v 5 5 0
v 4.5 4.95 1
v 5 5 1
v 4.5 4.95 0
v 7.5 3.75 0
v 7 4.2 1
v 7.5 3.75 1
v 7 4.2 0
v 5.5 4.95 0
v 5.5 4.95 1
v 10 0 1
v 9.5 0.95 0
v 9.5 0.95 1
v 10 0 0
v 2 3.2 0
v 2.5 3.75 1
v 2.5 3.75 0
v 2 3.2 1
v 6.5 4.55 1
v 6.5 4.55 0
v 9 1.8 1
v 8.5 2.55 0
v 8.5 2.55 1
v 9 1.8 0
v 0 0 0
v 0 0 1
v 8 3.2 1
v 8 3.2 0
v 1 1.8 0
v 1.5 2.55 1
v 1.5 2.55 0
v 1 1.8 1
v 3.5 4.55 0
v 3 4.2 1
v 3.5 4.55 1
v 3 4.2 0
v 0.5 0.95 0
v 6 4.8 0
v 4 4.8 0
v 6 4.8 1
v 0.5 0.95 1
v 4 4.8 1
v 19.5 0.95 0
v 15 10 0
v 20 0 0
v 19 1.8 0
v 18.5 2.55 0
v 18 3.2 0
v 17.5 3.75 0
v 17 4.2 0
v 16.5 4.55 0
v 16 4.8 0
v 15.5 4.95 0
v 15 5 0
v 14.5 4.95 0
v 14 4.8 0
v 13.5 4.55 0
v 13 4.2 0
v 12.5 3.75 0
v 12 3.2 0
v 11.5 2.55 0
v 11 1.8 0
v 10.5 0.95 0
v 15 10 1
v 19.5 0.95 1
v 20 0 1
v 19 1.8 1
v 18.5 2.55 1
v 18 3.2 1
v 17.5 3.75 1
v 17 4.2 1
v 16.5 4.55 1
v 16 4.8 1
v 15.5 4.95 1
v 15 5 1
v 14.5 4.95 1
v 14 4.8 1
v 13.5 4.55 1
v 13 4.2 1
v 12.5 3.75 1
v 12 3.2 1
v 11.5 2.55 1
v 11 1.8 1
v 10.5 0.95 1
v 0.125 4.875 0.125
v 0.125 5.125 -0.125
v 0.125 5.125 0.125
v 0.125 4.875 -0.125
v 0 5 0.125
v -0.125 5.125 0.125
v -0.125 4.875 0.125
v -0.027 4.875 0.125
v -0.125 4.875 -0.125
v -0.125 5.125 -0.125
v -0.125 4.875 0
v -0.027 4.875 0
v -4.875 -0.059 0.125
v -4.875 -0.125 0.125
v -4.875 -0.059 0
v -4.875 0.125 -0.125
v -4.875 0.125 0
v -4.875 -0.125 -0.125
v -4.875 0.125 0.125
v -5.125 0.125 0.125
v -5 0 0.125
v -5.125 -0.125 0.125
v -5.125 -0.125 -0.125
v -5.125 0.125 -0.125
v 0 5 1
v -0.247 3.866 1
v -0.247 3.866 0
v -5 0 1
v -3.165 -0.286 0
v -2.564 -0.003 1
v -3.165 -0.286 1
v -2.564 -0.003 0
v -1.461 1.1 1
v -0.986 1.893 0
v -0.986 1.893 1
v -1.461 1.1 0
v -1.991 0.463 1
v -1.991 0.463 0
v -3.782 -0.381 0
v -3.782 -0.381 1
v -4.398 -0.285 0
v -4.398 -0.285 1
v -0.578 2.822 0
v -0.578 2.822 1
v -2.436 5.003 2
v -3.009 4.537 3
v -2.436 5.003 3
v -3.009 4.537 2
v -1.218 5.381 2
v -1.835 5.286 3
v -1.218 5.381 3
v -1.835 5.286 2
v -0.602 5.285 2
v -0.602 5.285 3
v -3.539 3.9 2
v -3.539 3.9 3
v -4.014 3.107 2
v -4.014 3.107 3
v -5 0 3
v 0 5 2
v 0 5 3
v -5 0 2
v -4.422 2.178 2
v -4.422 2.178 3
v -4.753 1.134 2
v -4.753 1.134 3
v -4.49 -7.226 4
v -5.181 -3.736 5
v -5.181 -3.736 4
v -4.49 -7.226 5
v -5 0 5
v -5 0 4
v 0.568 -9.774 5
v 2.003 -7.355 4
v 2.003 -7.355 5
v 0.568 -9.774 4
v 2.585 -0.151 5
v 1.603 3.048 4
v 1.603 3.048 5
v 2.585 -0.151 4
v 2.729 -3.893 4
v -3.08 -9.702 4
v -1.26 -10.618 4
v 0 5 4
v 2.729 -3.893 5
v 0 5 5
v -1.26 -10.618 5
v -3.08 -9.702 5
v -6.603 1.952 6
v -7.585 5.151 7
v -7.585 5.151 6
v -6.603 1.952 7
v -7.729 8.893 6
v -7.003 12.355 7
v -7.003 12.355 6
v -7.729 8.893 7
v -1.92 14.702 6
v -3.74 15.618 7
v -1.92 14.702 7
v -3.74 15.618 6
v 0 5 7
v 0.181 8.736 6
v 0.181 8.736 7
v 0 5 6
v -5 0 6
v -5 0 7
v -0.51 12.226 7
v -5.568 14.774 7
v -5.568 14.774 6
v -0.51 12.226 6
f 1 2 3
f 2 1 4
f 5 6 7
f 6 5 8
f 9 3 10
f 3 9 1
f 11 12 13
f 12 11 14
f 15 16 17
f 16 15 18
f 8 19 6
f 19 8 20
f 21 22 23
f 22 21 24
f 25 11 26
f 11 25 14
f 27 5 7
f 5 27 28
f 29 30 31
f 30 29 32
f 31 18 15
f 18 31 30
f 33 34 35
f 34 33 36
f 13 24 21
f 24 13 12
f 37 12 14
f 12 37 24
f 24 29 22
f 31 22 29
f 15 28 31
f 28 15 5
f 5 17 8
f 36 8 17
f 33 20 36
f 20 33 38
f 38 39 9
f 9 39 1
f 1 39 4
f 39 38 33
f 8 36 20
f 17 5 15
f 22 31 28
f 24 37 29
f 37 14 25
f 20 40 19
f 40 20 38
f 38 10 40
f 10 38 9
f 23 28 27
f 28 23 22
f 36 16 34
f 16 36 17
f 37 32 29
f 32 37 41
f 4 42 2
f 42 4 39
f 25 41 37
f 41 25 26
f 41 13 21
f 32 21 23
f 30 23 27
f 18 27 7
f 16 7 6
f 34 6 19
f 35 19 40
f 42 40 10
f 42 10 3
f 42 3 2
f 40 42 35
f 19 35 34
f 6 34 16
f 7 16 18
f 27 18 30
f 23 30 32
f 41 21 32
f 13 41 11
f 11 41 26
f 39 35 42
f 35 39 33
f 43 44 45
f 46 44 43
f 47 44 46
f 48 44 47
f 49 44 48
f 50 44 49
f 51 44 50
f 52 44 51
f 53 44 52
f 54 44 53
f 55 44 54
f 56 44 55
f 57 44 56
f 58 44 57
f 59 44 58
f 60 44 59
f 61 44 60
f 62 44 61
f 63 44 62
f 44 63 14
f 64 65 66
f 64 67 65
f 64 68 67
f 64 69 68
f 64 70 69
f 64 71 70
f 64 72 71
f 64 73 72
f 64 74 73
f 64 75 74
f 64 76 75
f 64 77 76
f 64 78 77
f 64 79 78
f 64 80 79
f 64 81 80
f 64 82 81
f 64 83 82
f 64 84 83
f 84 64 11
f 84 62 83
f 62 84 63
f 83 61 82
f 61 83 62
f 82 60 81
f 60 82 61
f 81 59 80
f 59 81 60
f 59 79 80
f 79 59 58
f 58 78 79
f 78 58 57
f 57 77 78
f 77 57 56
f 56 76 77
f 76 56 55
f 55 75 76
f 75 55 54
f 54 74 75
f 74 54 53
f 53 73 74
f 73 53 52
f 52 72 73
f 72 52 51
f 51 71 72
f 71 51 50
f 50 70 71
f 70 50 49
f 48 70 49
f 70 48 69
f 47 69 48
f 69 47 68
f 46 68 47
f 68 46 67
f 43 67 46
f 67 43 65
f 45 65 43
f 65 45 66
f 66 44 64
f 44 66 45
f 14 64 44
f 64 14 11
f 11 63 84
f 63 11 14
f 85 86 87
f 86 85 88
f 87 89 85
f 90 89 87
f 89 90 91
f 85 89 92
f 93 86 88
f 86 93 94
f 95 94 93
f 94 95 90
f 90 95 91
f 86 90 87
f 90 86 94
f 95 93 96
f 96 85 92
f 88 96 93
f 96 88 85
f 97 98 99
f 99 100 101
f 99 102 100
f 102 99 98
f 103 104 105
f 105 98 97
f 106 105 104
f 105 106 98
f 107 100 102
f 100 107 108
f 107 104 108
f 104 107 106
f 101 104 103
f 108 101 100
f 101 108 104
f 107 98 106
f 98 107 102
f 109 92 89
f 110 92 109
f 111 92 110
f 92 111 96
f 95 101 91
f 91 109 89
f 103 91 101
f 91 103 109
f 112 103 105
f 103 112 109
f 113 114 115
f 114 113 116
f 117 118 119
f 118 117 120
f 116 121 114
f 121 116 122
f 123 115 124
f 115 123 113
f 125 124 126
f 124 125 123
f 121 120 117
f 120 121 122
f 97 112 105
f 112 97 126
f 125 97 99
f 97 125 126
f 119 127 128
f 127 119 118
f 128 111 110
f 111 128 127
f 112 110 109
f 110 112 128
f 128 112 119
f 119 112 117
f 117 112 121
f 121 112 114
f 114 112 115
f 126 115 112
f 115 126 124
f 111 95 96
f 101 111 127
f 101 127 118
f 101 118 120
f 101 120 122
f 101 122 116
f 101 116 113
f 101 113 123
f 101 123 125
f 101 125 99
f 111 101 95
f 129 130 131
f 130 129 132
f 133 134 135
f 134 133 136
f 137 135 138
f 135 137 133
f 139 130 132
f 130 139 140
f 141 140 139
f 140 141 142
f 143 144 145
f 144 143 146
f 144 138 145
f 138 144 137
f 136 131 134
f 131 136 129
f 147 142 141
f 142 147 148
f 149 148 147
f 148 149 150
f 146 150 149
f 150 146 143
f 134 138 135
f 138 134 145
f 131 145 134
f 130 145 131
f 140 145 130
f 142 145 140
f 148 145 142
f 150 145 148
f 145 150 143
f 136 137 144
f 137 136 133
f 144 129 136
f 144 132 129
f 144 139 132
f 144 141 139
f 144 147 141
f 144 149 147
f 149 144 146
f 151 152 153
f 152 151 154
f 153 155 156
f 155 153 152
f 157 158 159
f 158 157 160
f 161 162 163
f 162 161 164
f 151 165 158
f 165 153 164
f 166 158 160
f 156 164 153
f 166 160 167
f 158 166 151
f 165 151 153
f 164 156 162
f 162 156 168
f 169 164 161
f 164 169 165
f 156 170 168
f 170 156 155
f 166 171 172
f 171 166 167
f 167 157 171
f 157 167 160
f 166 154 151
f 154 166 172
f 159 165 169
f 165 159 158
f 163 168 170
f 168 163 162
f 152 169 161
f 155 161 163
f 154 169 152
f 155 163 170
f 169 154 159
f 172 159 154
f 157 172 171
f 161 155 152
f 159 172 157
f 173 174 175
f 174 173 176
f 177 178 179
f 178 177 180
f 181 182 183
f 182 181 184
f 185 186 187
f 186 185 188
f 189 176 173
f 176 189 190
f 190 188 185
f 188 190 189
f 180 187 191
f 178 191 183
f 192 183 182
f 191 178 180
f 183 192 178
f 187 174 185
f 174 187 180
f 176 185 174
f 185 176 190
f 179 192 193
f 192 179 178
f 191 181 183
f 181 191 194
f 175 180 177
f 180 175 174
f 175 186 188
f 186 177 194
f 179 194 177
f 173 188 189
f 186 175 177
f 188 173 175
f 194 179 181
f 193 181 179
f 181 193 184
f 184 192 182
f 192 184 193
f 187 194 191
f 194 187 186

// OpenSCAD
// Lines ----------------------------------------------------------------------
function linearBasis(a, b, t) =
  (1-t)*a +
  t*b;

function linearPoint(a, b, t) = [
  linearBasis(a[0], b[0], t),
  linearBasis(a[1], b[1], t)
];

// Quadratic Bezier Curves ----------------------------------------------------
function quadraticBezierBasis(a, b, c, t) =
  pow(1-t, 2)*a +
  2*(1-t)*t*b +
  pow(t,2)*c;

function quadraticBezierPoint(a, b, c, t) = [
  quadraticBezierBasis(a[0], b[0], c[0], t),
  quadraticBezierBasis(a[1], b[1], c[1], t)
];

module quadraticBezierShape(a, b, c, n=10, convex=true) {
  m = convex ? [(a[0] + c[0])/2, (a[1] + c[1])/2] : b;
  union() for (i = [0 : n-1]) {
    polygon(
      points = [
        m,
        quadraticBezierPoint(a, b, c, (i+1)/n),
        quadraticBezierPoint(a, b, c, i/n),
      ]
    );
  }
}

// Cubic Bezier Curves --------------------------------------------------------
function cubicBezierBasis(a, b, c, d, t) =
  pow(1-t,3)*a +
  3*pow(1-t,2)*t*b +
  3*(1-t)*pow(t,2)*c +
  pow(t,3)*d;

function cubicBezierPoint(a, b, c, d, t) = [
  cubicBezierBasis(a[0], b[0], c[0], d[0], t),
  cubicBezierBasis(a[1], b[1], c[1], d[1], t)
];

// Elliptical Arcs ------------------------------------------------------------
function ellipticalAngle(u, v) =
  sign(u[0]*v[1] - u[1]*v[0]) *
  acos(u[0]*v[0] + u[1]*v[1]) / (
    sqrt(u[0]*u[0] + u[1]*u[1]) *
    sqrt(v[0]*v[0] + v[1]*v[1])
  );

function ellipticalArcPoint(center, radii, rotation, angle) = [
  [cos(rotation), -sin(rotation)],
  [sin(rotation), cos(rotation)]
] * [
  radii[0] * cos(angle),
  radii[1] * sin(angle)
] + [
  center[0],
  center[1]
];

module ellipticalArcShape(center, radii, rotation, theta1, deltaTheta, n=10) {
  union() for (i = [0 : n-1]) {
    polygon(
      points = [
        center,
        ellipticalArcPoint(center, radii, rotation, theta1 + (deltaTheta * (i+1) / n)),
        ellipticalArcPoint(center, radii, rotation, theta1 + (deltaTheta * i / n))
      ]
    );
  }
}

module ellipticalArcShapeSVG(start, radii, rotation=0, large, sweep, end, n=10) {
  x1 = start[0];
  y1 = start[1];
  x2 = end[0];
  y2 = end[1];

  midpoint = [(x1 + x2) / 2, (y1 + y2) / 2];

  phi = rotation % 360;

  startPrime = [
    [cos(phi), sin(phi)],
    [-sin(phi), cos(phi)]
  ] * [
    (x1 - x2) / 2,
    (y1 - y2) / 2
  ];

  x1p = startPrime[0];
  y1p = startPrime[1];

  rxp = abs(radii[0]);
  ryp = abs(radii[1]);

  lamda = (x1p*x1p/rxp*rxp) + (y1p*y1p/ryp*ryp);

  rx = lamda <= 1 ? rxp : sqrt(lamda)*rxp;
  ry = lamda <= 1 ? ryp : sqrt(lamda)*ryp;

  rx = rxp;
  ry = ryp;

  centerPrime =
    (large == sweep ? -1 : 1) *
    sqrt(
      (rx*rx * ry*ry - rx*rx * y1p*y1p - ry*ry * x1p*x1p)
      /
      (rx*rx * y1p*y1p + ry*ry * x1p*x1p)
    ) * [
      rx * y1p / ry,
      -(ry * x1p / rx)
    ];

  cxp = centerPrime[0];
  cyp = centerPrime[1];

  center = [
    [cos(phi), -sin(phi)],
    [sin(phi), cos(phi)]
  ] * [
    cxp,
    cyp
  ] + [
    (x1 + x2) / 2,
    (y1 + y2) / 2
  ];

  theta1= ellipticalAngle(
    [1, 0],
    [(x1p - cxp) / rx, (y1p - cyp) / ry]
  );

  deltaThetaPrime = ellipticalAngle(
    [(x1p - cxp) / rx, (y1p - cyp) / ry],
    [(-x1p - cxp) / rx, (-y1p - cyp) / ry]
  ) % 360;

  //theta1 = theta1prime;

  deltaTheta =
    (sweep == 0 && deltaThetaPrime > 0)
    ? deltaThetaPrime - 360
    : (sweep == 1 && deltaThetaPrime < 0)
      ? deltaThetaPrime + 360
      : deltaThetaPrime;

  //echo("center", center, "theta1", theta1, "sweep", sweep, "deltaTheta", deltaTheta, "rx", rx, "ry", ry);

  union() for (i = [0 : n-1]) {
    polygon(
      points = [
        midpoint,
        ellipticalArcPoint(center, [rx, ry], rotation, theta1 + (deltaTheta * (i+1) / n)),
        ellipticalArcPoint(center, [rx, ry], rotation, theta1 + (deltaTheta * i / n))
      ]
    );
  }

  //translate(center) cylinder(r = 0.5, h = 1);
}

color("Purple") {
  linear_extrude(height = 1) quadraticBezierShape([0, 0], [5, 10], [10, 0], n=20);
  translate([10, 0]) linear_extrude(height = 1) quadraticBezierShape([0, 0], [5, 10], [10, 0], n=20, convex=false);
}

startPoint = [0, 5];
endPoint = [-5, 0];
radii = [4, 8];
rotation = 0;

color("Black") translate(startPoint) cube(0.25, center=true);
color("Black") translate(endPoint) cube(0.25, center=true);

//color("Orange") translate([0, 0, -10]) ellipticalArcShape([0, 0], [20, 10], 80, 0, 90, n=10);

color("Red", 0.2)    translate([0, 0, 0]) linear_extrude(height = 1) ellipticalArcShapeSVG(startPoint, radii, rotation, 0, 0, endPoint, n=10);
color("Green", 0.2)  translate([0, 0, 2]) linear_extrude(height = 1) ellipticalArcShapeSVG(startPoint, radii, rotation, 0, 1, endPoint, n=10);
color("Blue", 0.2)   translate([0, 0, 4]) linear_extrude(height = 1) ellipticalArcShapeSVG(startPoint, radii, rotation, 1, 0, endPoint, n=10);
color("Yellow", 0.2) translate([0, 0, 6]) linear_extrude(height = 1) ellipticalArcShapeSVG(startPoint, radii, rotation, 1, 1, endPoint, n=10);
